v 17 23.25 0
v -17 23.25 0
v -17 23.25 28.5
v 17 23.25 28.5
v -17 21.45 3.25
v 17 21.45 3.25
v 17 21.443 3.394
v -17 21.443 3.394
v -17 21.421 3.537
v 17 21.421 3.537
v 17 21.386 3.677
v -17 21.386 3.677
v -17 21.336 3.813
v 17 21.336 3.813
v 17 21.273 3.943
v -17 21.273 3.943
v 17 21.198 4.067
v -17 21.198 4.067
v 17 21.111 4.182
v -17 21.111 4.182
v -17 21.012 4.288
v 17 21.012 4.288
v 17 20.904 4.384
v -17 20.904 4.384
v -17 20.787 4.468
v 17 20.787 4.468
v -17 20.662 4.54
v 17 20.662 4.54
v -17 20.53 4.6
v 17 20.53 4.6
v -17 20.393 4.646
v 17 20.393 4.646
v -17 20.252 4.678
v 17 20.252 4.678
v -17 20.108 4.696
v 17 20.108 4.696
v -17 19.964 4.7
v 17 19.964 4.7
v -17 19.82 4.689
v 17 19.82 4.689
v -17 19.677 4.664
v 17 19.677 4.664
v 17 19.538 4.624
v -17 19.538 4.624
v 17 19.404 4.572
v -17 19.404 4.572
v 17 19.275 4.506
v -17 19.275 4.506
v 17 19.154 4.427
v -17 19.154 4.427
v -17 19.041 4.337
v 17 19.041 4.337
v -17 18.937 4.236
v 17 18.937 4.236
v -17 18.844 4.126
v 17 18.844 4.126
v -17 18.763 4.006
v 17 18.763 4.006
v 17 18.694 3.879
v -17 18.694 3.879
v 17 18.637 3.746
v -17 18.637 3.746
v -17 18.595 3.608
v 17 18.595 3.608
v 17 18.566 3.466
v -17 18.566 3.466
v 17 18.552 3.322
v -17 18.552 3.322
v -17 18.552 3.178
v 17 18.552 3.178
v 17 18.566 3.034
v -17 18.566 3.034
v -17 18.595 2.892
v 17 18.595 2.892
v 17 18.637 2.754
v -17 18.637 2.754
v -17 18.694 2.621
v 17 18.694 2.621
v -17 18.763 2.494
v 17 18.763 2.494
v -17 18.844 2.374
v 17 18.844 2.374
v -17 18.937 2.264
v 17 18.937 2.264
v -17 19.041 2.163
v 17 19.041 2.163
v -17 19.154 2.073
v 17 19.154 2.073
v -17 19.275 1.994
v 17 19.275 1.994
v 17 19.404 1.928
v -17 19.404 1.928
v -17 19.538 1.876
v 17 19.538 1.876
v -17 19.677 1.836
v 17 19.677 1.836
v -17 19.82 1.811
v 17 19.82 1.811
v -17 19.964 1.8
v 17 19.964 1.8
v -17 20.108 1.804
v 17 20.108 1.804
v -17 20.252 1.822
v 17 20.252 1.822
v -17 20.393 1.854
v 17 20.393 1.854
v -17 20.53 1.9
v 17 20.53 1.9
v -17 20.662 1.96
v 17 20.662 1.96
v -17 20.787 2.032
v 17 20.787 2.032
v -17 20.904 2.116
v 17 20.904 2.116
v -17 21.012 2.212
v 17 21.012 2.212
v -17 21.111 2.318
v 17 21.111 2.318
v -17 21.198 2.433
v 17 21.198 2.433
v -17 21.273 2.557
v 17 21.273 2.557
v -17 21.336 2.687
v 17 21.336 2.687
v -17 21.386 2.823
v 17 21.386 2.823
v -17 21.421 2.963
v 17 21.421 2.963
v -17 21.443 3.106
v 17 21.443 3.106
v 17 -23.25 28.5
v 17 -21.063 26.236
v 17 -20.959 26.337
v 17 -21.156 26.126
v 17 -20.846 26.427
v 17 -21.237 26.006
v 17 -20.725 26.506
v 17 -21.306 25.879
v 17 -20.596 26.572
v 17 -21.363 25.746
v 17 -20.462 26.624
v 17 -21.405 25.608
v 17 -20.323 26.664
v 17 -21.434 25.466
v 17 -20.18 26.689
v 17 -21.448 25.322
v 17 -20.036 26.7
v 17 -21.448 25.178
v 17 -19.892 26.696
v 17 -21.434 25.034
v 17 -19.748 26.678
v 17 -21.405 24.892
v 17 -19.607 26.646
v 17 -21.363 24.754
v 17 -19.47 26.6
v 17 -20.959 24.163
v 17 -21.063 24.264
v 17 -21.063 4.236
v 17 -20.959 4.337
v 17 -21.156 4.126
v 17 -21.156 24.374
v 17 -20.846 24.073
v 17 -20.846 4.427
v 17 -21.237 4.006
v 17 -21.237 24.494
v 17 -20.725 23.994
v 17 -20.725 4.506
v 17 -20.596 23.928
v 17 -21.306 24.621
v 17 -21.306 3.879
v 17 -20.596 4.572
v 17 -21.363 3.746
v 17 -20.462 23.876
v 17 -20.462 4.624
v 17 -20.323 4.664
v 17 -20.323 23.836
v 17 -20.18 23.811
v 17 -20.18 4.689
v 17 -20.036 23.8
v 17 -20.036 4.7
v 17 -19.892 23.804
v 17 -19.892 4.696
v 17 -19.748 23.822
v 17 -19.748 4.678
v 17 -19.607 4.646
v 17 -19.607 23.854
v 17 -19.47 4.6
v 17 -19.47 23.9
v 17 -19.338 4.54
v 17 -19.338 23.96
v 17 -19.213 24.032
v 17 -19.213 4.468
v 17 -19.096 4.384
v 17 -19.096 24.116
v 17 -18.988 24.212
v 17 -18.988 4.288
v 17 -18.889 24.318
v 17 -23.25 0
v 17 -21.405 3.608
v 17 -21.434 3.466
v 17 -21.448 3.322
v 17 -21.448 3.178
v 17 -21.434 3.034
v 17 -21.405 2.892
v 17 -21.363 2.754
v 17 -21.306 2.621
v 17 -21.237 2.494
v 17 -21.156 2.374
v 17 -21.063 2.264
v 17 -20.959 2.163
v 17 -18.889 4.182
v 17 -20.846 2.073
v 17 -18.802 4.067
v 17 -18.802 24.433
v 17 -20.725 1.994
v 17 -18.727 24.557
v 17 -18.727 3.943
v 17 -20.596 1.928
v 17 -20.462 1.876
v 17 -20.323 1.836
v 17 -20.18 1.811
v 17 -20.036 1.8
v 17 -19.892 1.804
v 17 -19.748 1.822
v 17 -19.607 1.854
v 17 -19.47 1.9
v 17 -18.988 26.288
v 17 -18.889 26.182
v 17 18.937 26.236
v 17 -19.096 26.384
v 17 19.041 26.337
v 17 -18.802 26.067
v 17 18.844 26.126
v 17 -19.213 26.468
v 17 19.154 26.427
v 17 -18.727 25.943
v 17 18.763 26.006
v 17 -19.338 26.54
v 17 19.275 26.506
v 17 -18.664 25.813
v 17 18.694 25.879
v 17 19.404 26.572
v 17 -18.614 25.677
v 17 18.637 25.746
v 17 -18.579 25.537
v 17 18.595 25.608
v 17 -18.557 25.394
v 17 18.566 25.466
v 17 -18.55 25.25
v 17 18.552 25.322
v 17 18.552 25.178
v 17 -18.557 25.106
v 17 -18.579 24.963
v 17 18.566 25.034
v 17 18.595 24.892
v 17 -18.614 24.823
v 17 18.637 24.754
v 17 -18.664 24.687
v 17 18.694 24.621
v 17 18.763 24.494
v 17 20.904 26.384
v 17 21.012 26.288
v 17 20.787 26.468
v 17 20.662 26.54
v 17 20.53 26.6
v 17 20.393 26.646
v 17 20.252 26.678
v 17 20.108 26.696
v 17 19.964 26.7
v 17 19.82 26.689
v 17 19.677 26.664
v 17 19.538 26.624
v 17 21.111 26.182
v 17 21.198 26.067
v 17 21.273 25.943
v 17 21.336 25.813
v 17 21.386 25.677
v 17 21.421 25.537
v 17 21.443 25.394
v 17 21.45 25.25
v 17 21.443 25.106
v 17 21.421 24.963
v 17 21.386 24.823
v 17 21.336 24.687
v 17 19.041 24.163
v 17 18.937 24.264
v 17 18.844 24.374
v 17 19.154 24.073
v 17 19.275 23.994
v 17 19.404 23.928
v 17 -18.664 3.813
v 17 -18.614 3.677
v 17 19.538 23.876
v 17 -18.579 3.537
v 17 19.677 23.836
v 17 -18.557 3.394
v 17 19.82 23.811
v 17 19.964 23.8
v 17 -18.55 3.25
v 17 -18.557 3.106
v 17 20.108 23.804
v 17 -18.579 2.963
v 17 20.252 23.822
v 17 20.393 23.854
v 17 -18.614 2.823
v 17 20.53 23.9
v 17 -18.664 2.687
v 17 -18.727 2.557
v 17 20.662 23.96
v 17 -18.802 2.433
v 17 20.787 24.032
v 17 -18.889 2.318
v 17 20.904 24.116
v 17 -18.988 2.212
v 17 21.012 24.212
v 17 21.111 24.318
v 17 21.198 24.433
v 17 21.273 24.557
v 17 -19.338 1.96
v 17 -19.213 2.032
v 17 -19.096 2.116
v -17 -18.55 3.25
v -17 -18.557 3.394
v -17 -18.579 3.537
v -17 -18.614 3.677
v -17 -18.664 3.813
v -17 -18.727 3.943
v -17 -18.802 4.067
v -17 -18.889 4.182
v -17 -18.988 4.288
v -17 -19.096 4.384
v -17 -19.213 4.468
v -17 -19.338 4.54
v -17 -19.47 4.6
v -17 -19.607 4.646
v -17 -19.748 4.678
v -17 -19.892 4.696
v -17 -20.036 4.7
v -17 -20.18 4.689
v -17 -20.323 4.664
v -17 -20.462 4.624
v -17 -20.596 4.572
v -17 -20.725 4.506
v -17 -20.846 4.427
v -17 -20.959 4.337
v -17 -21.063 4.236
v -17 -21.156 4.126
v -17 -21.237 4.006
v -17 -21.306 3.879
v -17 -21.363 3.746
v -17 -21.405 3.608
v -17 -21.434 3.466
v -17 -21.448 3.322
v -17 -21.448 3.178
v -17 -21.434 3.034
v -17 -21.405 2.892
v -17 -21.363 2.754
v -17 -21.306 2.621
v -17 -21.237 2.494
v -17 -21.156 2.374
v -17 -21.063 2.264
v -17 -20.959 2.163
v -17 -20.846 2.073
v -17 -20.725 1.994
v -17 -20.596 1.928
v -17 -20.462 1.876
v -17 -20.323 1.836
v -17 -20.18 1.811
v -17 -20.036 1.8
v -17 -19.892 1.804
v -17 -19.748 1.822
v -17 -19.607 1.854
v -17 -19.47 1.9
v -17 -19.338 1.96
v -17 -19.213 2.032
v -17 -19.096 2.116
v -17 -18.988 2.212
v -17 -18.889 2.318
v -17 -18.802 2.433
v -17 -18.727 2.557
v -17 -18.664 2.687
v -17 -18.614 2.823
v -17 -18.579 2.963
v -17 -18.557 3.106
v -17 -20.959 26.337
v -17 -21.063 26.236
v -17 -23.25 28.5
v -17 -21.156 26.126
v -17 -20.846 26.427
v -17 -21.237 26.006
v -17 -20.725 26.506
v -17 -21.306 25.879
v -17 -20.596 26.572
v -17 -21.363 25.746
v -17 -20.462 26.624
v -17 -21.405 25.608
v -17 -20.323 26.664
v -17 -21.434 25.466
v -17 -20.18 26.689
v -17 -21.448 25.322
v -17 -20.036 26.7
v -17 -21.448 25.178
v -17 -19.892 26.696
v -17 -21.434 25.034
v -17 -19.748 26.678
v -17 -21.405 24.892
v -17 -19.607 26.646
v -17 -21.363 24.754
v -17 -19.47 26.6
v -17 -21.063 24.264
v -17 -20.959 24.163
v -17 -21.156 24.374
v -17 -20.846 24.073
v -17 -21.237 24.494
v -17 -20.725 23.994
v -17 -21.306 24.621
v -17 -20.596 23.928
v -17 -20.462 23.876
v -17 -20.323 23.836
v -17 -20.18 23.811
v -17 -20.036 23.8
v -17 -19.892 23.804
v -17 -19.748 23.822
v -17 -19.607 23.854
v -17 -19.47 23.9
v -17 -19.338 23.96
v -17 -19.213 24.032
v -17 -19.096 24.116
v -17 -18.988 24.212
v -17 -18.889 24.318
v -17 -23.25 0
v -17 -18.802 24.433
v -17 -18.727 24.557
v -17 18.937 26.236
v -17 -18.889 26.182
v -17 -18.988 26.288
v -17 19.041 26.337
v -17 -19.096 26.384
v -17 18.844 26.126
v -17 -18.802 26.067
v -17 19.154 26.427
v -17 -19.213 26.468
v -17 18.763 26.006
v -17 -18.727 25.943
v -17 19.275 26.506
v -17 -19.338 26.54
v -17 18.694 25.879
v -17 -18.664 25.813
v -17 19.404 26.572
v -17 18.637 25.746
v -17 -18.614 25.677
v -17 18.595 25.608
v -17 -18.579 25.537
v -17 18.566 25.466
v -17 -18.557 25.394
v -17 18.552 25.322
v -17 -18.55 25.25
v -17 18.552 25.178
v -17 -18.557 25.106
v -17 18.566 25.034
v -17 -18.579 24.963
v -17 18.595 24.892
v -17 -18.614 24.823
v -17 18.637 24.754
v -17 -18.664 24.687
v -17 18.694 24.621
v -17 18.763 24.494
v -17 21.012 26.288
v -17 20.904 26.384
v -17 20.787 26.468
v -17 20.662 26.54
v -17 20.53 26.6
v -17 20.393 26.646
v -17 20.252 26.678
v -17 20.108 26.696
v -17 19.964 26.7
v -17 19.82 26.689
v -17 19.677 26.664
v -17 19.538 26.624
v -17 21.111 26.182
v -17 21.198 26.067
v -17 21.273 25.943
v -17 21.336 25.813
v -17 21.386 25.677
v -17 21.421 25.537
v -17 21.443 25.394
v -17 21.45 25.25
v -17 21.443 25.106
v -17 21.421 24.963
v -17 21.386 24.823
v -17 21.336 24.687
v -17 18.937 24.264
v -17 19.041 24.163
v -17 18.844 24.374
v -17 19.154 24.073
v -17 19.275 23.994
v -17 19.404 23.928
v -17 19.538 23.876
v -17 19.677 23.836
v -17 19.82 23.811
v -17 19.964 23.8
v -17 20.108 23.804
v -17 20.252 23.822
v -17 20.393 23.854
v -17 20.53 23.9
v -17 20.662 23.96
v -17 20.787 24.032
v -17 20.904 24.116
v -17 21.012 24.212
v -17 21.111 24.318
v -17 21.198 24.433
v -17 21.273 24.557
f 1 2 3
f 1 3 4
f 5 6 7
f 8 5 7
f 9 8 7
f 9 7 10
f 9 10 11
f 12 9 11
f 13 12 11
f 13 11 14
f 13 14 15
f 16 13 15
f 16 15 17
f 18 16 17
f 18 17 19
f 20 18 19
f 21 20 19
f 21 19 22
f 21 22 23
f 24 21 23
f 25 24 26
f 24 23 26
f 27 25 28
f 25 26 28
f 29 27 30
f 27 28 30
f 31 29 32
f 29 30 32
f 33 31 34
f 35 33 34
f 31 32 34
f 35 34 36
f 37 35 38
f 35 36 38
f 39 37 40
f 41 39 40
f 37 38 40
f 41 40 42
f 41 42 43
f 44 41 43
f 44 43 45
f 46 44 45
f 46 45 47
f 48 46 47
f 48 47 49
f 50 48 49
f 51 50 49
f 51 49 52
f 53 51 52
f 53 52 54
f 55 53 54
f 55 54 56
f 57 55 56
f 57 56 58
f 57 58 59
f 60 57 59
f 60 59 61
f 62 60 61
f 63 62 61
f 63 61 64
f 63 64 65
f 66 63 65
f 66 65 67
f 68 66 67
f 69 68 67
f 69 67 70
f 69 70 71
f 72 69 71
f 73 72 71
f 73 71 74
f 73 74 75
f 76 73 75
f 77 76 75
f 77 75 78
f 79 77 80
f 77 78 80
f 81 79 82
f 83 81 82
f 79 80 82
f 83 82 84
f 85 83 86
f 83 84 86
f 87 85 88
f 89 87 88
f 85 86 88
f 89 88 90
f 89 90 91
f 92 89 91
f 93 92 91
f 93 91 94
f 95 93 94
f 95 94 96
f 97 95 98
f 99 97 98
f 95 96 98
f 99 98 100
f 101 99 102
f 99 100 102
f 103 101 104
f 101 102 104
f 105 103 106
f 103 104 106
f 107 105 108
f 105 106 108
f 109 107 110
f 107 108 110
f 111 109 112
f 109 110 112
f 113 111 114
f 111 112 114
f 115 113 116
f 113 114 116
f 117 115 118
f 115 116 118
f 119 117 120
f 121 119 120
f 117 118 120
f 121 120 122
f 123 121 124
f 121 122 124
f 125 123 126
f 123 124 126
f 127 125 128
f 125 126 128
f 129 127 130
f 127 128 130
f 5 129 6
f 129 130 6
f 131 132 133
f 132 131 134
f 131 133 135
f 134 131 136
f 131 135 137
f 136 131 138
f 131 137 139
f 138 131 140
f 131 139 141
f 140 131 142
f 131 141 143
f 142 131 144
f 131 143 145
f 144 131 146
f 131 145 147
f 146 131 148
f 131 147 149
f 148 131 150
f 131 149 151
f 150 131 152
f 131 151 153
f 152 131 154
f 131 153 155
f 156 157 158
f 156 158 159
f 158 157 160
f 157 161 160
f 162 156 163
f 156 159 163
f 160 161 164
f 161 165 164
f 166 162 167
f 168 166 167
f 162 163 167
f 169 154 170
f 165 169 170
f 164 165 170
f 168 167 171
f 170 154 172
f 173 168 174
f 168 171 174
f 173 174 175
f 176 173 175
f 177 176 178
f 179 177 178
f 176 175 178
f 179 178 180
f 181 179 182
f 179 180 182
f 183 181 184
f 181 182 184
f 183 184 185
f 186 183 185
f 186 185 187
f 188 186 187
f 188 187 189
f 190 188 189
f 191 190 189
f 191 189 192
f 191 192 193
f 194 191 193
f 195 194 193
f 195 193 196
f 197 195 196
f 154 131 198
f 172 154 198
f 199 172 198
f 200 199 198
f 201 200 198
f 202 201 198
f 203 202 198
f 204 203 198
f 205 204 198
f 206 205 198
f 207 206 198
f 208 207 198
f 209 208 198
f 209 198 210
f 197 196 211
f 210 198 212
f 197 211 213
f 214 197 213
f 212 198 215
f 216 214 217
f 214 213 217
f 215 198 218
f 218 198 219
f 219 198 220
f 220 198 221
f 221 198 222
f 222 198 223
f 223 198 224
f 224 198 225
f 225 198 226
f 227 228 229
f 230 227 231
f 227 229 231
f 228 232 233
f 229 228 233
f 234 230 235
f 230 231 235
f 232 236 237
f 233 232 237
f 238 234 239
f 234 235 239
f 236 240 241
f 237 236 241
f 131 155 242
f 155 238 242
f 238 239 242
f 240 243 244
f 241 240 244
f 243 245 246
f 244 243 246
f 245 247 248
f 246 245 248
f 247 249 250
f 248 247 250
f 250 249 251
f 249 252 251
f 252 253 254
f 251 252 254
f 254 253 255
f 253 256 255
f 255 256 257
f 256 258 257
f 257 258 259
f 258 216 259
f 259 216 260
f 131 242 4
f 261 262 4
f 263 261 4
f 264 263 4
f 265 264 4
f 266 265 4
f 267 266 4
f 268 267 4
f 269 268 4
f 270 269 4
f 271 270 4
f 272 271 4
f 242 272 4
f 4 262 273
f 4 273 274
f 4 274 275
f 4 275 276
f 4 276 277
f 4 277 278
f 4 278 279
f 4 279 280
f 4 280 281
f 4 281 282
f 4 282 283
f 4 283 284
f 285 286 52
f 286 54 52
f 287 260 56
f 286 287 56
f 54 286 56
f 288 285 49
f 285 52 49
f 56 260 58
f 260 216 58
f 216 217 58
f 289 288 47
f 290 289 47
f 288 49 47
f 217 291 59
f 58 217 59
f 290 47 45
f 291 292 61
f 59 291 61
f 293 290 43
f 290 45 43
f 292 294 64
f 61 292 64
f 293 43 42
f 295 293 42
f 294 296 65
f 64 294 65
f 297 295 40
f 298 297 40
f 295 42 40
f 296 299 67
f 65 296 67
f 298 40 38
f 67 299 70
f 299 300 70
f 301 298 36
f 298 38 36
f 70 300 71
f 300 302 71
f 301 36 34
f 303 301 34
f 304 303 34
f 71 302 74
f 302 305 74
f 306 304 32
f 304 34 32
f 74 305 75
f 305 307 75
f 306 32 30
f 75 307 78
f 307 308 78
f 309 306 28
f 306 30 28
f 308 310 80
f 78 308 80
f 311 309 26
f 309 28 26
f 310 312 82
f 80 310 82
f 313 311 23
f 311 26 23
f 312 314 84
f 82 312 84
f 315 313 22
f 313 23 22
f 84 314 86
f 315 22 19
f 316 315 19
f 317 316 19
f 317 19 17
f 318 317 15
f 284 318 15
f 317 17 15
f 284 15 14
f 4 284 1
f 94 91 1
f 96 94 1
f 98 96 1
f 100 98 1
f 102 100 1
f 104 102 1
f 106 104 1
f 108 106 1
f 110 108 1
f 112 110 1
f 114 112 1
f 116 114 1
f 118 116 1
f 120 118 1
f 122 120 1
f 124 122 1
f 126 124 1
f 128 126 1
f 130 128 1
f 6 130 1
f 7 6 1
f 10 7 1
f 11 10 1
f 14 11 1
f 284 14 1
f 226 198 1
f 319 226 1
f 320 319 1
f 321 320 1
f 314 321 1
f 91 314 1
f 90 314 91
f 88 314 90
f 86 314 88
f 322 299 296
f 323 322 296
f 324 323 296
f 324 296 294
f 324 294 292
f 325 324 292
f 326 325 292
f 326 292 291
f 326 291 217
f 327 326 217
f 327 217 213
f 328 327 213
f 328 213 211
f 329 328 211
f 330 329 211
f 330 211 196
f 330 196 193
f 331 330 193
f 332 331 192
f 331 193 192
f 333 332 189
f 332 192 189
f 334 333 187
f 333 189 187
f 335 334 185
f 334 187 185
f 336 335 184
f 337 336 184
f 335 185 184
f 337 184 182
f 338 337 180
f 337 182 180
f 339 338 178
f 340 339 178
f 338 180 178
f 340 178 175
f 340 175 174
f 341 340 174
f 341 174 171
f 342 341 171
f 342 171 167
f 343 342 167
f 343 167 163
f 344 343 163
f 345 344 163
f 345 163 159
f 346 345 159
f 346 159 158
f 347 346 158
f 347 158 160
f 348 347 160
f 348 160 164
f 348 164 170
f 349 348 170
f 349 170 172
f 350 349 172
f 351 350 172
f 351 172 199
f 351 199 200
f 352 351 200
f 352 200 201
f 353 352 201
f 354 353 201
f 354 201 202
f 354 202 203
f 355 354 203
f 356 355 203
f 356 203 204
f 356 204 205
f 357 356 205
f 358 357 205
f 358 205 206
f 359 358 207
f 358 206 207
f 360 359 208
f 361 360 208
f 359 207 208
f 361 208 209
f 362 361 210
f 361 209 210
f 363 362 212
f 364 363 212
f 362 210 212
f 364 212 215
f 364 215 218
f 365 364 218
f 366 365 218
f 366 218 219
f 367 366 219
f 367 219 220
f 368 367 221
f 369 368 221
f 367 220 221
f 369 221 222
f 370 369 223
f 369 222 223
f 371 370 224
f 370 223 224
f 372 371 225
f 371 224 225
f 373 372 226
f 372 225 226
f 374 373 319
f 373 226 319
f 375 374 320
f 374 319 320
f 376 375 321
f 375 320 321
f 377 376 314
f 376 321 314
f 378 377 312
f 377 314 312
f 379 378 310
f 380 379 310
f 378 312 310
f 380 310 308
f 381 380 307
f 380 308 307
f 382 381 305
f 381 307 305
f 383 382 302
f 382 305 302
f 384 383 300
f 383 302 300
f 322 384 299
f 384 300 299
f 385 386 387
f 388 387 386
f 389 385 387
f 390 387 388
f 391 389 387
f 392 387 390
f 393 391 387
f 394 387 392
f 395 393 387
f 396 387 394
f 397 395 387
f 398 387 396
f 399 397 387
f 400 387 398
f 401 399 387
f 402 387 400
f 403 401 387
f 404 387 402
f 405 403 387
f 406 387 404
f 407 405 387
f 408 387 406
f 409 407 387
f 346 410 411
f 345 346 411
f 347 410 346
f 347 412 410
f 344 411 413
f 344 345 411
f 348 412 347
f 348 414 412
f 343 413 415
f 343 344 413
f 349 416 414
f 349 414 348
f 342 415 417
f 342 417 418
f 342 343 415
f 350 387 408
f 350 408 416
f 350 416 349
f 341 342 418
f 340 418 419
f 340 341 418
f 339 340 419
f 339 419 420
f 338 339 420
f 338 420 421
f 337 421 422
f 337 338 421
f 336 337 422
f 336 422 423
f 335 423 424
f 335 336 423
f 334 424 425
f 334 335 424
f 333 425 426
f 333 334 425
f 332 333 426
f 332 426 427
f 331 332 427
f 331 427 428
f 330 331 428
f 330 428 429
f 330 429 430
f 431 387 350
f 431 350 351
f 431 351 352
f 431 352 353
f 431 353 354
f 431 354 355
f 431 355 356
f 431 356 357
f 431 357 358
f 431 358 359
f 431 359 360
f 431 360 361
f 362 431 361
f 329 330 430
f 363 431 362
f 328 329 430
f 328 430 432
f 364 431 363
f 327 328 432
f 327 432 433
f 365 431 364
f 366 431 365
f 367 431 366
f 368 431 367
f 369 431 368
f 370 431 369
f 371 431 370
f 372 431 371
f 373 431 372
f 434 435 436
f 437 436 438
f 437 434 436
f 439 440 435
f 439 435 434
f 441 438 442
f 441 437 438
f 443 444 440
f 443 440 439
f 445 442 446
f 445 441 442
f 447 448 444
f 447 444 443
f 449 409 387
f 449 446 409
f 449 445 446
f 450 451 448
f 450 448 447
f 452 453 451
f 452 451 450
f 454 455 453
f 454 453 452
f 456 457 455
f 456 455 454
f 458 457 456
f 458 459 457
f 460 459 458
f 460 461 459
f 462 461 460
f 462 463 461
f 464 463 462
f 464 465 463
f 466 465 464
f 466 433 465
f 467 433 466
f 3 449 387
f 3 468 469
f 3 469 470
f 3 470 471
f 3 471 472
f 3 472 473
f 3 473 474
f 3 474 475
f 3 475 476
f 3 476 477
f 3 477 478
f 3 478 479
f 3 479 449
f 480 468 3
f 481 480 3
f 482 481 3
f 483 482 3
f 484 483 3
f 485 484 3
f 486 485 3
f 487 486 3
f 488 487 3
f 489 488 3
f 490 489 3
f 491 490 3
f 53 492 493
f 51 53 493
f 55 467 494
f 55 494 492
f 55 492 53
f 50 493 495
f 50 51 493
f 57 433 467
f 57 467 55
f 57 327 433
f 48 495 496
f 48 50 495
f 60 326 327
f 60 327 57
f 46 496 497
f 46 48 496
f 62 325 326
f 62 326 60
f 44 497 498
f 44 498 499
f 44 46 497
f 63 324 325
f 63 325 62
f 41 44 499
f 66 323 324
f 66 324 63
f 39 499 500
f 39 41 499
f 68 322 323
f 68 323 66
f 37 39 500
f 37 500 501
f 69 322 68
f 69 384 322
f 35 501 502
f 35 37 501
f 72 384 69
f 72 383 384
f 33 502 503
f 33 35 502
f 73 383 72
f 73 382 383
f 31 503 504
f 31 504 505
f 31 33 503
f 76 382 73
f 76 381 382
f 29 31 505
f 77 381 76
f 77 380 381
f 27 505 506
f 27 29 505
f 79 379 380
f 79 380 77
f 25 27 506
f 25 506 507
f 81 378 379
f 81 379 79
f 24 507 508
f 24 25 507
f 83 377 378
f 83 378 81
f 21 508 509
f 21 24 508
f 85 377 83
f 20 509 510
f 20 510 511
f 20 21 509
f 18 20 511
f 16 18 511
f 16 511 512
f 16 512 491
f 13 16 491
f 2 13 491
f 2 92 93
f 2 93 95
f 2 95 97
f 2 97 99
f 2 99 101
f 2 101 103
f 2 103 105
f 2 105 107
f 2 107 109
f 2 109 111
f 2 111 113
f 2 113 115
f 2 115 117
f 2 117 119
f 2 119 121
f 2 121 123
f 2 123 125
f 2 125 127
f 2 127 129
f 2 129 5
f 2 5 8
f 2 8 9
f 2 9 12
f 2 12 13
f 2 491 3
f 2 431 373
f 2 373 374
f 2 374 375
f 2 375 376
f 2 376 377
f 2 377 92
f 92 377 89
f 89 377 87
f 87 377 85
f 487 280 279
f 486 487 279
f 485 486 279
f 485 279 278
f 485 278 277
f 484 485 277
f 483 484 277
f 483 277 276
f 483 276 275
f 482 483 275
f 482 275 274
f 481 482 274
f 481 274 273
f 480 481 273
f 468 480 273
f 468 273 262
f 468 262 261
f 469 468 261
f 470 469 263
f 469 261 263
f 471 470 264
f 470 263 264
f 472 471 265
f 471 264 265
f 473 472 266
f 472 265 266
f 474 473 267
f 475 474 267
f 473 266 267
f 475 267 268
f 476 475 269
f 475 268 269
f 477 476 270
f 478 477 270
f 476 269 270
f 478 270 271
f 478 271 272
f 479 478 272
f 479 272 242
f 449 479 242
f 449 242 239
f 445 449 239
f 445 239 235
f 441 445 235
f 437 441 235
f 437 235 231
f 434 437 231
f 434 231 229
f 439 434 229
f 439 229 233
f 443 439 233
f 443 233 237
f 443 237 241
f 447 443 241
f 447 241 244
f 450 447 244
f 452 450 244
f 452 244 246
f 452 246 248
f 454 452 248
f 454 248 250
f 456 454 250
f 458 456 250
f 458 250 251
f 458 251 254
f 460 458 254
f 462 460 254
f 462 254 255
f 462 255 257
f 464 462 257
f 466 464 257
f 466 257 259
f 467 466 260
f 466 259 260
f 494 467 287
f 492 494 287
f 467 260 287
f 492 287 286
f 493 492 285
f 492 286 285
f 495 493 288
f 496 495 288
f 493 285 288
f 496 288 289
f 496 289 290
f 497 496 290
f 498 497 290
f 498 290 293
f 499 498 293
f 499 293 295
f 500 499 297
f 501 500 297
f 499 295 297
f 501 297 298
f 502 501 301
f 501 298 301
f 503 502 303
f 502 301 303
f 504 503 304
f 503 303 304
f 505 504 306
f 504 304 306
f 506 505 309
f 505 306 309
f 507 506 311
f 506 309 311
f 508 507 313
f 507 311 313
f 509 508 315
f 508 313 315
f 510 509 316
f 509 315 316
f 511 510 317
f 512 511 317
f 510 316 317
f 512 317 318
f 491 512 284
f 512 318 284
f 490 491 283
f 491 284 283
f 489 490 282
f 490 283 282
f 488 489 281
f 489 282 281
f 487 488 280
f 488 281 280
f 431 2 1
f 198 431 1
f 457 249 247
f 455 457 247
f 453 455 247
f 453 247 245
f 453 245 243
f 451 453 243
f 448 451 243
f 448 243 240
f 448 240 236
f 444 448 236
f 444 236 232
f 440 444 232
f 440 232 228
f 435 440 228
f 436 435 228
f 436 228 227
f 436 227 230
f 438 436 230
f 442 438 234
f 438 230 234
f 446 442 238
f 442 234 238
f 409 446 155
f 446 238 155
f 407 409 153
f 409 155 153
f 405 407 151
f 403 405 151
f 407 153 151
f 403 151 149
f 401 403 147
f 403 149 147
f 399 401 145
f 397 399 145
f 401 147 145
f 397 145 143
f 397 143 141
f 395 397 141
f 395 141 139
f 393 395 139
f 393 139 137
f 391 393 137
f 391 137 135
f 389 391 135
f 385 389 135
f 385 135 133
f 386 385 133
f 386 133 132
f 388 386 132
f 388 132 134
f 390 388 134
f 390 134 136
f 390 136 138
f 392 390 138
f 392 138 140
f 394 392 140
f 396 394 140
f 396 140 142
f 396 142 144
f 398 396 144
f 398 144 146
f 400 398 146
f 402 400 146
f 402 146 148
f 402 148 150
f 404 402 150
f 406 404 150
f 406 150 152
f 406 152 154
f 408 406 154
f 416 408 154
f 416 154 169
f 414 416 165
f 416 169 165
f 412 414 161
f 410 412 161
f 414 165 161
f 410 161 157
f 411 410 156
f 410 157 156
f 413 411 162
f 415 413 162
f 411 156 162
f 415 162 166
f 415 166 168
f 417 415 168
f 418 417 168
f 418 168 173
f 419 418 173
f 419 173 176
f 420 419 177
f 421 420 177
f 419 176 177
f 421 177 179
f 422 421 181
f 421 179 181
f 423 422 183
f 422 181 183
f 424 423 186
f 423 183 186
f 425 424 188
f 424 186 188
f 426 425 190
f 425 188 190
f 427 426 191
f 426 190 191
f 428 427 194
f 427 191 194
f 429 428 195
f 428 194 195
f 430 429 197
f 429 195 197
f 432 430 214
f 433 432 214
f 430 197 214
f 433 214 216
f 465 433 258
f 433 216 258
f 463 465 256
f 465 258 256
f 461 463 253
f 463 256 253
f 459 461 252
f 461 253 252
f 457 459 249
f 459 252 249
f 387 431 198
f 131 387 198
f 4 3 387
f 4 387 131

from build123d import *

# Parameters (mm, degrees)
SKETCH1_W           = 34
SKETCH1_H           = 46.5
BOSS_EXTRUDE1_DEPTH = 28.5
SKETCH2_R           = 1.45
CUT_EXTRUDE1_DEPTH  = 51.088047476


with BuildPart() as part:
    # Sketch1 → Boss-Extrude1 (new body)
    with BuildSketch(Plane.XY):
        Rectangle(SKETCH1_W, SKETCH1_H)
    extrude(amount=BOSS_EXTRUDE1_DEPTH)

    # Sketch2 → Cut-Extrude1 (cut, through all)
    with BuildSketch(Plane(origin=(17, 0, 0), x_dir=(0, 0, -1), z_dir=(1, 0, 0))):
        with Locations(Location((-25.25, 20, 0), (0, 0, 90))):
            Circle(SKETCH2_R)
        with Locations(Location((-3.25, 20, 0), (0, 0, 90))):
            Circle(SKETCH2_R)
        with Locations(Location((-3.25, -20, 0), (0, 0, 90))):
            Circle(SKETCH2_R)
        with Locations(Location((-25.25, -20, 0), (0, 0, 90))):
            Circle(SKETCH2_R)
    extrude(amount=-CUT_EXTRUDE1_DEPTH, mode=Mode.SUBTRACT)


solid = part.part
